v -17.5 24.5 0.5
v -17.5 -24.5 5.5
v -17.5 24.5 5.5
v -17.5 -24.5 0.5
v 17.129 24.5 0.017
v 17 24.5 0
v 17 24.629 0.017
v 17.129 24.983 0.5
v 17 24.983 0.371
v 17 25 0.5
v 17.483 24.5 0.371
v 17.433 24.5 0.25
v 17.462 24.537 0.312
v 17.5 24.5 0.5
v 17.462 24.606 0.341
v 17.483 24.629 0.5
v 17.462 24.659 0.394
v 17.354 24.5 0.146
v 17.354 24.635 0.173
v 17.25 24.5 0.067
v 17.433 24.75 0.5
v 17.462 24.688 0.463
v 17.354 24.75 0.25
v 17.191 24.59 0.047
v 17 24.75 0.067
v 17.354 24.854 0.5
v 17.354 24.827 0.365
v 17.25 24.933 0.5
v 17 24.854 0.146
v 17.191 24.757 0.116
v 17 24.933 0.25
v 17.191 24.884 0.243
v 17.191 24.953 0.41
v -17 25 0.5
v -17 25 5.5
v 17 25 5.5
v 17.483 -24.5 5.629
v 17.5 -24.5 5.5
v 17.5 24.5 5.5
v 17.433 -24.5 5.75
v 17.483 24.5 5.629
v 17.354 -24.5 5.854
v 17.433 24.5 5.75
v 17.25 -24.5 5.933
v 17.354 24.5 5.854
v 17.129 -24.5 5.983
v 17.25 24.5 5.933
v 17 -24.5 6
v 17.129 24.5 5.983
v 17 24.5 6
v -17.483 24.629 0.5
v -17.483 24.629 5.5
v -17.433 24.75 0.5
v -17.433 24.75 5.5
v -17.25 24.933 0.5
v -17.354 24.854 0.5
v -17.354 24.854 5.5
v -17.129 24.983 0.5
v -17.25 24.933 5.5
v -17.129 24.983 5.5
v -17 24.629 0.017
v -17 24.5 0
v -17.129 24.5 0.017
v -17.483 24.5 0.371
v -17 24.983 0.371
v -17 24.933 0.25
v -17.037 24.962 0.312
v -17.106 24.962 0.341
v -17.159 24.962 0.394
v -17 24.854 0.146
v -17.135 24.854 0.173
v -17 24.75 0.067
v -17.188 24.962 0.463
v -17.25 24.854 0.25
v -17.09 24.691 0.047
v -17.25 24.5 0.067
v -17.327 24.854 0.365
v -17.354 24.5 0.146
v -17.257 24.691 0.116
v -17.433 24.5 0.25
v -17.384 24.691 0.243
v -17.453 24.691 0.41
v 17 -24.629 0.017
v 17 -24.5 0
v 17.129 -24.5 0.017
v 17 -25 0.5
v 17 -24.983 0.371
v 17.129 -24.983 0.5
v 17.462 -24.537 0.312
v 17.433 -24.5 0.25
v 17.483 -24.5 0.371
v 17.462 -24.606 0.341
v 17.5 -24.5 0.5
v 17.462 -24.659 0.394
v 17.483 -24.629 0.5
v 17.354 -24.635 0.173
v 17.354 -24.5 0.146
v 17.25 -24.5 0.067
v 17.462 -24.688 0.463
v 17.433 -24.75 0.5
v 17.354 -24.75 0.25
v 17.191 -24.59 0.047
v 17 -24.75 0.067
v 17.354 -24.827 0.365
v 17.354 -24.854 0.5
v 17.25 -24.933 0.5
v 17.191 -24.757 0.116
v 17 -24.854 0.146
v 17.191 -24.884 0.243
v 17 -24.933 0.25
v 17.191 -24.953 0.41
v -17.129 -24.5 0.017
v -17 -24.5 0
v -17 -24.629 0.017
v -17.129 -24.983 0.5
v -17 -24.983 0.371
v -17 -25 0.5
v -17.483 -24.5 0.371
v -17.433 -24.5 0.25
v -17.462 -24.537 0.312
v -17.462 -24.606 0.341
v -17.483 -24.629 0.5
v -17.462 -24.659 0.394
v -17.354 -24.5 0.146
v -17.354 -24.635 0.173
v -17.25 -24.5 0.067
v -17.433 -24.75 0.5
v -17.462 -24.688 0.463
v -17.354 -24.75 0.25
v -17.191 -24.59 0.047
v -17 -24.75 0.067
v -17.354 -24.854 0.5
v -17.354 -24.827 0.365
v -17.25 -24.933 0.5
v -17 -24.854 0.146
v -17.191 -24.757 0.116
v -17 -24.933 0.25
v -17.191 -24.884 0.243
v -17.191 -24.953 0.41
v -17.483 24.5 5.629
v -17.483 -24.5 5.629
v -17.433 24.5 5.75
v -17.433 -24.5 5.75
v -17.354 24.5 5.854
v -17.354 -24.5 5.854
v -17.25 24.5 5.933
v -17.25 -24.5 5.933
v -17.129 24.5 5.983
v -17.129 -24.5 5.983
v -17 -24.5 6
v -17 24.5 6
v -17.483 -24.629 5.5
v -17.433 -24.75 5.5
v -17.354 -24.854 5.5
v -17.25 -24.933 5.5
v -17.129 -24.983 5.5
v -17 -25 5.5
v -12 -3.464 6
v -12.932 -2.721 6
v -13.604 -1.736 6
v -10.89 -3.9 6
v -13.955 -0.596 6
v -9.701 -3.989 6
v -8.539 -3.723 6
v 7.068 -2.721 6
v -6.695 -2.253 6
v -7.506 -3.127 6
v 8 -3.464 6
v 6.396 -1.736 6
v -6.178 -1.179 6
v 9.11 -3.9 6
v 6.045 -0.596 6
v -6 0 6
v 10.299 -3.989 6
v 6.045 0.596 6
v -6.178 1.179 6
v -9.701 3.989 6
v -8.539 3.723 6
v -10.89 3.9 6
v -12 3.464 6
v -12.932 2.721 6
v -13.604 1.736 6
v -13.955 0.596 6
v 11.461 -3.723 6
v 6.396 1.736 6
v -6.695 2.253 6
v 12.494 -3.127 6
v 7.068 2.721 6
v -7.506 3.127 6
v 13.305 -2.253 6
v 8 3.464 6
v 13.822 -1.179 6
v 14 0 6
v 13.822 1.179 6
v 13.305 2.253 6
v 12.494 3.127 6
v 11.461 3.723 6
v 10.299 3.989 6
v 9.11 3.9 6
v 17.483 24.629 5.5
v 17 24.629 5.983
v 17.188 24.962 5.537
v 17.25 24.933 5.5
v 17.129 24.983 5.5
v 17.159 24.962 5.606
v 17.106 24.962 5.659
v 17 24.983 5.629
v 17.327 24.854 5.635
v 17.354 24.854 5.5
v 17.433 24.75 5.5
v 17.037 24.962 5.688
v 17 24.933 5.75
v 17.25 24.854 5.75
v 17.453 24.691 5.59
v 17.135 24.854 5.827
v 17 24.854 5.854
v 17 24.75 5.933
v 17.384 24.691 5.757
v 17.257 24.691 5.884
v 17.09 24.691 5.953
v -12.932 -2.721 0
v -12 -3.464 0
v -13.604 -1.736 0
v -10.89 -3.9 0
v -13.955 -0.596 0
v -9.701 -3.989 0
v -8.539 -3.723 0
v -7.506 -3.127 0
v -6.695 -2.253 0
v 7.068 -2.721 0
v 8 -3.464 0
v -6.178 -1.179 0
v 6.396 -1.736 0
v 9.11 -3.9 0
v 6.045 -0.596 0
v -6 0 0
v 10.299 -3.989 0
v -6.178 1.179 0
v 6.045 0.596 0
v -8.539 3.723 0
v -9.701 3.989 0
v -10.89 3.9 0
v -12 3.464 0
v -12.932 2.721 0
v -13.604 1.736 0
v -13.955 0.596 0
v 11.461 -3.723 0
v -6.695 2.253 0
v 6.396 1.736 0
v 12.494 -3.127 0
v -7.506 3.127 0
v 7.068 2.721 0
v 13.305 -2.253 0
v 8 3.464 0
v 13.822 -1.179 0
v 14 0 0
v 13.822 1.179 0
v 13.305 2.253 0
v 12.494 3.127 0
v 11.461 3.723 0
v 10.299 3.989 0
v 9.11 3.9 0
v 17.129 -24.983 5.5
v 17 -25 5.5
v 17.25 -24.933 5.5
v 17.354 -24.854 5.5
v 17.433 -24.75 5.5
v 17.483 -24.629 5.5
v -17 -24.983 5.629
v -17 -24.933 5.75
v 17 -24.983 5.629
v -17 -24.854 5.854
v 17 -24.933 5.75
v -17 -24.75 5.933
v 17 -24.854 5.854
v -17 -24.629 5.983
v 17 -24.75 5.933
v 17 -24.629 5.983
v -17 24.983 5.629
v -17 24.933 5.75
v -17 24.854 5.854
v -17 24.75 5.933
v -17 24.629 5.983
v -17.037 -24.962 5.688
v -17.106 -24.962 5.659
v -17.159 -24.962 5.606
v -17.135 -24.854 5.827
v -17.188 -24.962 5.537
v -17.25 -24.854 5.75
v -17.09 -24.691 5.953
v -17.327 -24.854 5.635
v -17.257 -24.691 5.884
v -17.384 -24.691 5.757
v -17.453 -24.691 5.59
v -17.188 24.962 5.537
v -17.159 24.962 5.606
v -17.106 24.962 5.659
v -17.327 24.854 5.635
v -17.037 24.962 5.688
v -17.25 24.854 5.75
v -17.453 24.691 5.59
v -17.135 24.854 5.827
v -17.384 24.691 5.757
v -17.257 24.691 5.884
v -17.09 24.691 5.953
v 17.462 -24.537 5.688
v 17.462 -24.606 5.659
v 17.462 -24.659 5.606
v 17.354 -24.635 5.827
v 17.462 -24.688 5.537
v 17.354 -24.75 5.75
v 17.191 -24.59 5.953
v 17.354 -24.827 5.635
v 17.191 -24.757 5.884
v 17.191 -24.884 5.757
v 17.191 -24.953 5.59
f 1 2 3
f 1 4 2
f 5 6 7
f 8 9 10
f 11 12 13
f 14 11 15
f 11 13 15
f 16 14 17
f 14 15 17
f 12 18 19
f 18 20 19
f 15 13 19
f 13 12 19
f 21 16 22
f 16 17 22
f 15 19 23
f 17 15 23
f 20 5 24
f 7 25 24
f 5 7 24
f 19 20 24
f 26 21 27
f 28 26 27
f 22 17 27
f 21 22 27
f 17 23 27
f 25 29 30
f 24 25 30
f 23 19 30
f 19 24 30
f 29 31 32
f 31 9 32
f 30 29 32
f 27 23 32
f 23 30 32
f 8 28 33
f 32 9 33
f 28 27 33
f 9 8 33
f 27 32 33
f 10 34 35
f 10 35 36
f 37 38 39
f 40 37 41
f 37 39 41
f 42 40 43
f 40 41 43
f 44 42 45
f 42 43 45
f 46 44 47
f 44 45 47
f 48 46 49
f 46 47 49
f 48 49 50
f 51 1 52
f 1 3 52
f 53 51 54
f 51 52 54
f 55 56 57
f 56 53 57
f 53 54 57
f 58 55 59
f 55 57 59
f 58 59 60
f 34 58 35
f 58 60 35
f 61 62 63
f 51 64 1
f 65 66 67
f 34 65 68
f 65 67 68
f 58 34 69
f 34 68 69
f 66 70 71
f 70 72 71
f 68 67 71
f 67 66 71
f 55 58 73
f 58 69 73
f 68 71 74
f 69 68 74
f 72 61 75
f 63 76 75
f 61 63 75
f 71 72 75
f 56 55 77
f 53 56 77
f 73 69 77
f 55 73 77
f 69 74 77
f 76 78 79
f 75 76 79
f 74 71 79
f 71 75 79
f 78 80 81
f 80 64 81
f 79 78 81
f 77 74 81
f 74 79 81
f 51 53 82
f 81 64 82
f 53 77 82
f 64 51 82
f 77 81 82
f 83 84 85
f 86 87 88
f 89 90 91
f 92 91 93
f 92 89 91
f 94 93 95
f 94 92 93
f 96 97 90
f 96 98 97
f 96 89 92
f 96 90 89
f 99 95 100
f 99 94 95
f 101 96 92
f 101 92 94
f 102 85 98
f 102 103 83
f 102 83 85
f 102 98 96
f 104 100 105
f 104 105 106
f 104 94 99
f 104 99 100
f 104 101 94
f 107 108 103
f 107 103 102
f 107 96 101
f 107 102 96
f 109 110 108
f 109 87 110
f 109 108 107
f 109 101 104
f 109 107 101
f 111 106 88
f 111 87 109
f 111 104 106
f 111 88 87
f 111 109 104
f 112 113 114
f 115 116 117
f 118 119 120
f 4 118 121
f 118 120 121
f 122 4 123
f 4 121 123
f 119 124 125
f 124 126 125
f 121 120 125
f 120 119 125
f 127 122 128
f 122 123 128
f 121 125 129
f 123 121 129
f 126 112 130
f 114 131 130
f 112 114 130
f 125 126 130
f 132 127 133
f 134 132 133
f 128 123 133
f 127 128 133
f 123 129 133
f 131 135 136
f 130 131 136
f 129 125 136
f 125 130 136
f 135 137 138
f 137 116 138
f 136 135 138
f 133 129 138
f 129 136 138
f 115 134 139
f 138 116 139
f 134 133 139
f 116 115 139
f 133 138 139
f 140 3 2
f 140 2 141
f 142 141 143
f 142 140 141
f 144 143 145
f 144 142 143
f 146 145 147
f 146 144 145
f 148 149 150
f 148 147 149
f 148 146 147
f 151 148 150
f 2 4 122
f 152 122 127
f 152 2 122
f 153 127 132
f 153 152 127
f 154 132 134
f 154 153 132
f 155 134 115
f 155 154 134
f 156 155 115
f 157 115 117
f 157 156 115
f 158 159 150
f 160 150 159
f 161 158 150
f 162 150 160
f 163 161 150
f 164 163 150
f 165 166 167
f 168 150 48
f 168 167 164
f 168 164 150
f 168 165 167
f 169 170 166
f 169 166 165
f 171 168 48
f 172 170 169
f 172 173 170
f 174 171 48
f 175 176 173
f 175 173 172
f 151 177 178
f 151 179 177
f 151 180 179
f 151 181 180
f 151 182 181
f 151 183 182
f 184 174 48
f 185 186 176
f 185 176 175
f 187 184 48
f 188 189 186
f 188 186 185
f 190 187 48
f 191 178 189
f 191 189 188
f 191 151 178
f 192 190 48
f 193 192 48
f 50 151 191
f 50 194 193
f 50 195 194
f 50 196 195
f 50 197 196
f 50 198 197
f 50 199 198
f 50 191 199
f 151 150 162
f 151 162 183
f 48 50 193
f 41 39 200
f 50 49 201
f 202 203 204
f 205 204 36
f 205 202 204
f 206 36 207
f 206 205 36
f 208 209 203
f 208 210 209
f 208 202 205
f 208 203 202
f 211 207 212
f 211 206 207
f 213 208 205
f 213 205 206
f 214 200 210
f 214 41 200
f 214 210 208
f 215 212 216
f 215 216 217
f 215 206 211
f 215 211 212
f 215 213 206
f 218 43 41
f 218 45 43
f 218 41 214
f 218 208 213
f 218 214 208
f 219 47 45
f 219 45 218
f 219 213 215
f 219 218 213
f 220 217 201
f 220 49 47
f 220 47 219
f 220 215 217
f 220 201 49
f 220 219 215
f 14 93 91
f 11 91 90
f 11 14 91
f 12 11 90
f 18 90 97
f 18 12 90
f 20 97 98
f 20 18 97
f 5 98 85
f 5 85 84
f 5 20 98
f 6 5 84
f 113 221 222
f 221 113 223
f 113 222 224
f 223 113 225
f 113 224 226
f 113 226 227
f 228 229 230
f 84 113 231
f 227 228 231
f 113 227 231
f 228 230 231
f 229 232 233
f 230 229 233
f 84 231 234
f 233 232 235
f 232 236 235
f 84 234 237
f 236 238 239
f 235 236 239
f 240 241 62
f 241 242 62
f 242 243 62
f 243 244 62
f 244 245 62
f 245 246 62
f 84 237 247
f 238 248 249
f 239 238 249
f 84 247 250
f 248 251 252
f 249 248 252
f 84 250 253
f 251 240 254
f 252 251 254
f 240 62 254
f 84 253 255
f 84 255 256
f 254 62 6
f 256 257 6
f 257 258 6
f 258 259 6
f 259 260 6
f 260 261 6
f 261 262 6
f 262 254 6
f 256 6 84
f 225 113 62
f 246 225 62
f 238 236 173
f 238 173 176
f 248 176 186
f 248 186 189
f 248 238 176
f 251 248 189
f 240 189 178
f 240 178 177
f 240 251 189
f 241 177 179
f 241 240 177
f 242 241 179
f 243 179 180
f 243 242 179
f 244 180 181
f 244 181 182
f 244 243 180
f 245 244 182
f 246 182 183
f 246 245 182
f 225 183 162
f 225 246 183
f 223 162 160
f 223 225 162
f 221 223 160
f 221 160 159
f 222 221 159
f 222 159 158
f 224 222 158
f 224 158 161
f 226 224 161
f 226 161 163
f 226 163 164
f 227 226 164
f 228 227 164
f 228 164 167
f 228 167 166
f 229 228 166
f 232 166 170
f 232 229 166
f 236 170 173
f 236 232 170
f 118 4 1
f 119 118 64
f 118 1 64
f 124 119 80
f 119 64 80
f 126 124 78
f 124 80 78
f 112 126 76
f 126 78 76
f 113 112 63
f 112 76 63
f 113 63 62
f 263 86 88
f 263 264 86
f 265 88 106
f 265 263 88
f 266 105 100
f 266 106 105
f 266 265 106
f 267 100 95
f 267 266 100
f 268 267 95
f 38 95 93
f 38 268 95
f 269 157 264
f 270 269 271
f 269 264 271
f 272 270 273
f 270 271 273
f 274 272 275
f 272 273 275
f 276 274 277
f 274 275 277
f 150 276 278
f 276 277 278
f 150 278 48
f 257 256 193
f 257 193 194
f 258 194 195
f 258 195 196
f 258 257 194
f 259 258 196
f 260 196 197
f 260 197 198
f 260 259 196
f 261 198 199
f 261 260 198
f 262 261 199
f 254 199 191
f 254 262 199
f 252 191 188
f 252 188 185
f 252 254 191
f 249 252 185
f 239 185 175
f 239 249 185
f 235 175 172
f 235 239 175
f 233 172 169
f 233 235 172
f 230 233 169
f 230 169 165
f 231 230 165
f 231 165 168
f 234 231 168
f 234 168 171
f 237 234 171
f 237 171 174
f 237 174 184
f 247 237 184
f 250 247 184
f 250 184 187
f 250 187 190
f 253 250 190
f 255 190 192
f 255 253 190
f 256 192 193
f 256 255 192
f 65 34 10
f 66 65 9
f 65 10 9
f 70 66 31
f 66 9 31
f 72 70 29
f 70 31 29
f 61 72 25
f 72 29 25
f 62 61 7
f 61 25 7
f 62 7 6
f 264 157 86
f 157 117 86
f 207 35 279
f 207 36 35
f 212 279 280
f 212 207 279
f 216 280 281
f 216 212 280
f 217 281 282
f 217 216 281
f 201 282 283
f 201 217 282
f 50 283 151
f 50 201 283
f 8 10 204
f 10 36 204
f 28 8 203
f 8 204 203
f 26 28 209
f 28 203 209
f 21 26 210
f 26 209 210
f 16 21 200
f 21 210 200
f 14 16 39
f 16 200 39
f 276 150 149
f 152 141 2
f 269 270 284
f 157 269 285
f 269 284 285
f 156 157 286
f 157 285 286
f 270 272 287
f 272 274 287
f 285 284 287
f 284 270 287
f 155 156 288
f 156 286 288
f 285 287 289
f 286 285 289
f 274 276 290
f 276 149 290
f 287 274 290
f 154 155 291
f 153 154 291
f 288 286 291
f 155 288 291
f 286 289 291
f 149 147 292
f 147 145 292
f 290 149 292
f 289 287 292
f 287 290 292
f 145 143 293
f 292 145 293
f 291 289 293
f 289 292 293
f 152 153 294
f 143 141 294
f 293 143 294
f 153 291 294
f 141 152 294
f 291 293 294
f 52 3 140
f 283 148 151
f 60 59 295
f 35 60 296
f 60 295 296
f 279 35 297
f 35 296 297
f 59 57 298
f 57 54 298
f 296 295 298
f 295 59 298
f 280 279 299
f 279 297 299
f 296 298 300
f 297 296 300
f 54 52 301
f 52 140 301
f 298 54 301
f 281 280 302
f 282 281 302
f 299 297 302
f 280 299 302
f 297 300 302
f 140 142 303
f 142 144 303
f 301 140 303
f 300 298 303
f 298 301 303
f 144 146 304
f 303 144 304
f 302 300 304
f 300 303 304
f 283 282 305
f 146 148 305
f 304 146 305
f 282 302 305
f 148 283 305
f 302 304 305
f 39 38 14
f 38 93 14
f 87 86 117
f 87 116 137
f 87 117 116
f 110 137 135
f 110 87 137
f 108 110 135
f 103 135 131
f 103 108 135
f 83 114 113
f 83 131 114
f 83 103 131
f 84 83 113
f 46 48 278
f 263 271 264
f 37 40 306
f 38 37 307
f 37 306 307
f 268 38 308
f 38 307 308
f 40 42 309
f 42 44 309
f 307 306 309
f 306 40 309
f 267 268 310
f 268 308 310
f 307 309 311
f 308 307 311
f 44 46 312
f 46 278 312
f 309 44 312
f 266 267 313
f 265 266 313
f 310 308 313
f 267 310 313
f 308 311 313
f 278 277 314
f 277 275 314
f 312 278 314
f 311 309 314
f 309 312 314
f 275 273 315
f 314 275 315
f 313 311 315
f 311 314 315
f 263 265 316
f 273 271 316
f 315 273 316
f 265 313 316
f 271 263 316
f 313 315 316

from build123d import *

# Parameters (mm, degrees)
SKETCH1_W           = 35
SKETCH1_H           = 50
SKETCH1_R           = 4
BOSS_EXTRUDE1_DEPTH = 6
FILLET1_R           = 0.5


with BuildPart() as part:
    # Sketch1 → Boss-Extrude1 (new body)
    with BuildSketch(Plane.XY):
        Rectangle(SKETCH1_W, SKETCH1_H)
        with Locations((-10, 0)):
            Circle(SKETCH1_R, mode=Mode.SUBTRACT)
        with Locations((10, 0)):
            Circle(SKETCH1_R, mode=Mode.SUBTRACT)
    extrude(amount=BOSS_EXTRUDE1_DEPTH)

    # Fillet1
    fillet1_edges = [part.edges().sort_by_distance(p)[0] for p in [
        (-17.5, 0, 6),
        (0, -25, 6),
        (17.5, 0, 6),
        (0, -25, 0),
        (-17.5, 0, 0),
        (0, 25, 0),
        (17.5, 0, 0),
        (17.5, -25, 3),
        (-17.5, -25, 3),
        (-17.5, 25, 3),
        (17.5, 25, 3),
        (0, 25, 6),
    ]]
    fillet(fillet1_edges, radius=FILLET1_R)


solid = part.part
